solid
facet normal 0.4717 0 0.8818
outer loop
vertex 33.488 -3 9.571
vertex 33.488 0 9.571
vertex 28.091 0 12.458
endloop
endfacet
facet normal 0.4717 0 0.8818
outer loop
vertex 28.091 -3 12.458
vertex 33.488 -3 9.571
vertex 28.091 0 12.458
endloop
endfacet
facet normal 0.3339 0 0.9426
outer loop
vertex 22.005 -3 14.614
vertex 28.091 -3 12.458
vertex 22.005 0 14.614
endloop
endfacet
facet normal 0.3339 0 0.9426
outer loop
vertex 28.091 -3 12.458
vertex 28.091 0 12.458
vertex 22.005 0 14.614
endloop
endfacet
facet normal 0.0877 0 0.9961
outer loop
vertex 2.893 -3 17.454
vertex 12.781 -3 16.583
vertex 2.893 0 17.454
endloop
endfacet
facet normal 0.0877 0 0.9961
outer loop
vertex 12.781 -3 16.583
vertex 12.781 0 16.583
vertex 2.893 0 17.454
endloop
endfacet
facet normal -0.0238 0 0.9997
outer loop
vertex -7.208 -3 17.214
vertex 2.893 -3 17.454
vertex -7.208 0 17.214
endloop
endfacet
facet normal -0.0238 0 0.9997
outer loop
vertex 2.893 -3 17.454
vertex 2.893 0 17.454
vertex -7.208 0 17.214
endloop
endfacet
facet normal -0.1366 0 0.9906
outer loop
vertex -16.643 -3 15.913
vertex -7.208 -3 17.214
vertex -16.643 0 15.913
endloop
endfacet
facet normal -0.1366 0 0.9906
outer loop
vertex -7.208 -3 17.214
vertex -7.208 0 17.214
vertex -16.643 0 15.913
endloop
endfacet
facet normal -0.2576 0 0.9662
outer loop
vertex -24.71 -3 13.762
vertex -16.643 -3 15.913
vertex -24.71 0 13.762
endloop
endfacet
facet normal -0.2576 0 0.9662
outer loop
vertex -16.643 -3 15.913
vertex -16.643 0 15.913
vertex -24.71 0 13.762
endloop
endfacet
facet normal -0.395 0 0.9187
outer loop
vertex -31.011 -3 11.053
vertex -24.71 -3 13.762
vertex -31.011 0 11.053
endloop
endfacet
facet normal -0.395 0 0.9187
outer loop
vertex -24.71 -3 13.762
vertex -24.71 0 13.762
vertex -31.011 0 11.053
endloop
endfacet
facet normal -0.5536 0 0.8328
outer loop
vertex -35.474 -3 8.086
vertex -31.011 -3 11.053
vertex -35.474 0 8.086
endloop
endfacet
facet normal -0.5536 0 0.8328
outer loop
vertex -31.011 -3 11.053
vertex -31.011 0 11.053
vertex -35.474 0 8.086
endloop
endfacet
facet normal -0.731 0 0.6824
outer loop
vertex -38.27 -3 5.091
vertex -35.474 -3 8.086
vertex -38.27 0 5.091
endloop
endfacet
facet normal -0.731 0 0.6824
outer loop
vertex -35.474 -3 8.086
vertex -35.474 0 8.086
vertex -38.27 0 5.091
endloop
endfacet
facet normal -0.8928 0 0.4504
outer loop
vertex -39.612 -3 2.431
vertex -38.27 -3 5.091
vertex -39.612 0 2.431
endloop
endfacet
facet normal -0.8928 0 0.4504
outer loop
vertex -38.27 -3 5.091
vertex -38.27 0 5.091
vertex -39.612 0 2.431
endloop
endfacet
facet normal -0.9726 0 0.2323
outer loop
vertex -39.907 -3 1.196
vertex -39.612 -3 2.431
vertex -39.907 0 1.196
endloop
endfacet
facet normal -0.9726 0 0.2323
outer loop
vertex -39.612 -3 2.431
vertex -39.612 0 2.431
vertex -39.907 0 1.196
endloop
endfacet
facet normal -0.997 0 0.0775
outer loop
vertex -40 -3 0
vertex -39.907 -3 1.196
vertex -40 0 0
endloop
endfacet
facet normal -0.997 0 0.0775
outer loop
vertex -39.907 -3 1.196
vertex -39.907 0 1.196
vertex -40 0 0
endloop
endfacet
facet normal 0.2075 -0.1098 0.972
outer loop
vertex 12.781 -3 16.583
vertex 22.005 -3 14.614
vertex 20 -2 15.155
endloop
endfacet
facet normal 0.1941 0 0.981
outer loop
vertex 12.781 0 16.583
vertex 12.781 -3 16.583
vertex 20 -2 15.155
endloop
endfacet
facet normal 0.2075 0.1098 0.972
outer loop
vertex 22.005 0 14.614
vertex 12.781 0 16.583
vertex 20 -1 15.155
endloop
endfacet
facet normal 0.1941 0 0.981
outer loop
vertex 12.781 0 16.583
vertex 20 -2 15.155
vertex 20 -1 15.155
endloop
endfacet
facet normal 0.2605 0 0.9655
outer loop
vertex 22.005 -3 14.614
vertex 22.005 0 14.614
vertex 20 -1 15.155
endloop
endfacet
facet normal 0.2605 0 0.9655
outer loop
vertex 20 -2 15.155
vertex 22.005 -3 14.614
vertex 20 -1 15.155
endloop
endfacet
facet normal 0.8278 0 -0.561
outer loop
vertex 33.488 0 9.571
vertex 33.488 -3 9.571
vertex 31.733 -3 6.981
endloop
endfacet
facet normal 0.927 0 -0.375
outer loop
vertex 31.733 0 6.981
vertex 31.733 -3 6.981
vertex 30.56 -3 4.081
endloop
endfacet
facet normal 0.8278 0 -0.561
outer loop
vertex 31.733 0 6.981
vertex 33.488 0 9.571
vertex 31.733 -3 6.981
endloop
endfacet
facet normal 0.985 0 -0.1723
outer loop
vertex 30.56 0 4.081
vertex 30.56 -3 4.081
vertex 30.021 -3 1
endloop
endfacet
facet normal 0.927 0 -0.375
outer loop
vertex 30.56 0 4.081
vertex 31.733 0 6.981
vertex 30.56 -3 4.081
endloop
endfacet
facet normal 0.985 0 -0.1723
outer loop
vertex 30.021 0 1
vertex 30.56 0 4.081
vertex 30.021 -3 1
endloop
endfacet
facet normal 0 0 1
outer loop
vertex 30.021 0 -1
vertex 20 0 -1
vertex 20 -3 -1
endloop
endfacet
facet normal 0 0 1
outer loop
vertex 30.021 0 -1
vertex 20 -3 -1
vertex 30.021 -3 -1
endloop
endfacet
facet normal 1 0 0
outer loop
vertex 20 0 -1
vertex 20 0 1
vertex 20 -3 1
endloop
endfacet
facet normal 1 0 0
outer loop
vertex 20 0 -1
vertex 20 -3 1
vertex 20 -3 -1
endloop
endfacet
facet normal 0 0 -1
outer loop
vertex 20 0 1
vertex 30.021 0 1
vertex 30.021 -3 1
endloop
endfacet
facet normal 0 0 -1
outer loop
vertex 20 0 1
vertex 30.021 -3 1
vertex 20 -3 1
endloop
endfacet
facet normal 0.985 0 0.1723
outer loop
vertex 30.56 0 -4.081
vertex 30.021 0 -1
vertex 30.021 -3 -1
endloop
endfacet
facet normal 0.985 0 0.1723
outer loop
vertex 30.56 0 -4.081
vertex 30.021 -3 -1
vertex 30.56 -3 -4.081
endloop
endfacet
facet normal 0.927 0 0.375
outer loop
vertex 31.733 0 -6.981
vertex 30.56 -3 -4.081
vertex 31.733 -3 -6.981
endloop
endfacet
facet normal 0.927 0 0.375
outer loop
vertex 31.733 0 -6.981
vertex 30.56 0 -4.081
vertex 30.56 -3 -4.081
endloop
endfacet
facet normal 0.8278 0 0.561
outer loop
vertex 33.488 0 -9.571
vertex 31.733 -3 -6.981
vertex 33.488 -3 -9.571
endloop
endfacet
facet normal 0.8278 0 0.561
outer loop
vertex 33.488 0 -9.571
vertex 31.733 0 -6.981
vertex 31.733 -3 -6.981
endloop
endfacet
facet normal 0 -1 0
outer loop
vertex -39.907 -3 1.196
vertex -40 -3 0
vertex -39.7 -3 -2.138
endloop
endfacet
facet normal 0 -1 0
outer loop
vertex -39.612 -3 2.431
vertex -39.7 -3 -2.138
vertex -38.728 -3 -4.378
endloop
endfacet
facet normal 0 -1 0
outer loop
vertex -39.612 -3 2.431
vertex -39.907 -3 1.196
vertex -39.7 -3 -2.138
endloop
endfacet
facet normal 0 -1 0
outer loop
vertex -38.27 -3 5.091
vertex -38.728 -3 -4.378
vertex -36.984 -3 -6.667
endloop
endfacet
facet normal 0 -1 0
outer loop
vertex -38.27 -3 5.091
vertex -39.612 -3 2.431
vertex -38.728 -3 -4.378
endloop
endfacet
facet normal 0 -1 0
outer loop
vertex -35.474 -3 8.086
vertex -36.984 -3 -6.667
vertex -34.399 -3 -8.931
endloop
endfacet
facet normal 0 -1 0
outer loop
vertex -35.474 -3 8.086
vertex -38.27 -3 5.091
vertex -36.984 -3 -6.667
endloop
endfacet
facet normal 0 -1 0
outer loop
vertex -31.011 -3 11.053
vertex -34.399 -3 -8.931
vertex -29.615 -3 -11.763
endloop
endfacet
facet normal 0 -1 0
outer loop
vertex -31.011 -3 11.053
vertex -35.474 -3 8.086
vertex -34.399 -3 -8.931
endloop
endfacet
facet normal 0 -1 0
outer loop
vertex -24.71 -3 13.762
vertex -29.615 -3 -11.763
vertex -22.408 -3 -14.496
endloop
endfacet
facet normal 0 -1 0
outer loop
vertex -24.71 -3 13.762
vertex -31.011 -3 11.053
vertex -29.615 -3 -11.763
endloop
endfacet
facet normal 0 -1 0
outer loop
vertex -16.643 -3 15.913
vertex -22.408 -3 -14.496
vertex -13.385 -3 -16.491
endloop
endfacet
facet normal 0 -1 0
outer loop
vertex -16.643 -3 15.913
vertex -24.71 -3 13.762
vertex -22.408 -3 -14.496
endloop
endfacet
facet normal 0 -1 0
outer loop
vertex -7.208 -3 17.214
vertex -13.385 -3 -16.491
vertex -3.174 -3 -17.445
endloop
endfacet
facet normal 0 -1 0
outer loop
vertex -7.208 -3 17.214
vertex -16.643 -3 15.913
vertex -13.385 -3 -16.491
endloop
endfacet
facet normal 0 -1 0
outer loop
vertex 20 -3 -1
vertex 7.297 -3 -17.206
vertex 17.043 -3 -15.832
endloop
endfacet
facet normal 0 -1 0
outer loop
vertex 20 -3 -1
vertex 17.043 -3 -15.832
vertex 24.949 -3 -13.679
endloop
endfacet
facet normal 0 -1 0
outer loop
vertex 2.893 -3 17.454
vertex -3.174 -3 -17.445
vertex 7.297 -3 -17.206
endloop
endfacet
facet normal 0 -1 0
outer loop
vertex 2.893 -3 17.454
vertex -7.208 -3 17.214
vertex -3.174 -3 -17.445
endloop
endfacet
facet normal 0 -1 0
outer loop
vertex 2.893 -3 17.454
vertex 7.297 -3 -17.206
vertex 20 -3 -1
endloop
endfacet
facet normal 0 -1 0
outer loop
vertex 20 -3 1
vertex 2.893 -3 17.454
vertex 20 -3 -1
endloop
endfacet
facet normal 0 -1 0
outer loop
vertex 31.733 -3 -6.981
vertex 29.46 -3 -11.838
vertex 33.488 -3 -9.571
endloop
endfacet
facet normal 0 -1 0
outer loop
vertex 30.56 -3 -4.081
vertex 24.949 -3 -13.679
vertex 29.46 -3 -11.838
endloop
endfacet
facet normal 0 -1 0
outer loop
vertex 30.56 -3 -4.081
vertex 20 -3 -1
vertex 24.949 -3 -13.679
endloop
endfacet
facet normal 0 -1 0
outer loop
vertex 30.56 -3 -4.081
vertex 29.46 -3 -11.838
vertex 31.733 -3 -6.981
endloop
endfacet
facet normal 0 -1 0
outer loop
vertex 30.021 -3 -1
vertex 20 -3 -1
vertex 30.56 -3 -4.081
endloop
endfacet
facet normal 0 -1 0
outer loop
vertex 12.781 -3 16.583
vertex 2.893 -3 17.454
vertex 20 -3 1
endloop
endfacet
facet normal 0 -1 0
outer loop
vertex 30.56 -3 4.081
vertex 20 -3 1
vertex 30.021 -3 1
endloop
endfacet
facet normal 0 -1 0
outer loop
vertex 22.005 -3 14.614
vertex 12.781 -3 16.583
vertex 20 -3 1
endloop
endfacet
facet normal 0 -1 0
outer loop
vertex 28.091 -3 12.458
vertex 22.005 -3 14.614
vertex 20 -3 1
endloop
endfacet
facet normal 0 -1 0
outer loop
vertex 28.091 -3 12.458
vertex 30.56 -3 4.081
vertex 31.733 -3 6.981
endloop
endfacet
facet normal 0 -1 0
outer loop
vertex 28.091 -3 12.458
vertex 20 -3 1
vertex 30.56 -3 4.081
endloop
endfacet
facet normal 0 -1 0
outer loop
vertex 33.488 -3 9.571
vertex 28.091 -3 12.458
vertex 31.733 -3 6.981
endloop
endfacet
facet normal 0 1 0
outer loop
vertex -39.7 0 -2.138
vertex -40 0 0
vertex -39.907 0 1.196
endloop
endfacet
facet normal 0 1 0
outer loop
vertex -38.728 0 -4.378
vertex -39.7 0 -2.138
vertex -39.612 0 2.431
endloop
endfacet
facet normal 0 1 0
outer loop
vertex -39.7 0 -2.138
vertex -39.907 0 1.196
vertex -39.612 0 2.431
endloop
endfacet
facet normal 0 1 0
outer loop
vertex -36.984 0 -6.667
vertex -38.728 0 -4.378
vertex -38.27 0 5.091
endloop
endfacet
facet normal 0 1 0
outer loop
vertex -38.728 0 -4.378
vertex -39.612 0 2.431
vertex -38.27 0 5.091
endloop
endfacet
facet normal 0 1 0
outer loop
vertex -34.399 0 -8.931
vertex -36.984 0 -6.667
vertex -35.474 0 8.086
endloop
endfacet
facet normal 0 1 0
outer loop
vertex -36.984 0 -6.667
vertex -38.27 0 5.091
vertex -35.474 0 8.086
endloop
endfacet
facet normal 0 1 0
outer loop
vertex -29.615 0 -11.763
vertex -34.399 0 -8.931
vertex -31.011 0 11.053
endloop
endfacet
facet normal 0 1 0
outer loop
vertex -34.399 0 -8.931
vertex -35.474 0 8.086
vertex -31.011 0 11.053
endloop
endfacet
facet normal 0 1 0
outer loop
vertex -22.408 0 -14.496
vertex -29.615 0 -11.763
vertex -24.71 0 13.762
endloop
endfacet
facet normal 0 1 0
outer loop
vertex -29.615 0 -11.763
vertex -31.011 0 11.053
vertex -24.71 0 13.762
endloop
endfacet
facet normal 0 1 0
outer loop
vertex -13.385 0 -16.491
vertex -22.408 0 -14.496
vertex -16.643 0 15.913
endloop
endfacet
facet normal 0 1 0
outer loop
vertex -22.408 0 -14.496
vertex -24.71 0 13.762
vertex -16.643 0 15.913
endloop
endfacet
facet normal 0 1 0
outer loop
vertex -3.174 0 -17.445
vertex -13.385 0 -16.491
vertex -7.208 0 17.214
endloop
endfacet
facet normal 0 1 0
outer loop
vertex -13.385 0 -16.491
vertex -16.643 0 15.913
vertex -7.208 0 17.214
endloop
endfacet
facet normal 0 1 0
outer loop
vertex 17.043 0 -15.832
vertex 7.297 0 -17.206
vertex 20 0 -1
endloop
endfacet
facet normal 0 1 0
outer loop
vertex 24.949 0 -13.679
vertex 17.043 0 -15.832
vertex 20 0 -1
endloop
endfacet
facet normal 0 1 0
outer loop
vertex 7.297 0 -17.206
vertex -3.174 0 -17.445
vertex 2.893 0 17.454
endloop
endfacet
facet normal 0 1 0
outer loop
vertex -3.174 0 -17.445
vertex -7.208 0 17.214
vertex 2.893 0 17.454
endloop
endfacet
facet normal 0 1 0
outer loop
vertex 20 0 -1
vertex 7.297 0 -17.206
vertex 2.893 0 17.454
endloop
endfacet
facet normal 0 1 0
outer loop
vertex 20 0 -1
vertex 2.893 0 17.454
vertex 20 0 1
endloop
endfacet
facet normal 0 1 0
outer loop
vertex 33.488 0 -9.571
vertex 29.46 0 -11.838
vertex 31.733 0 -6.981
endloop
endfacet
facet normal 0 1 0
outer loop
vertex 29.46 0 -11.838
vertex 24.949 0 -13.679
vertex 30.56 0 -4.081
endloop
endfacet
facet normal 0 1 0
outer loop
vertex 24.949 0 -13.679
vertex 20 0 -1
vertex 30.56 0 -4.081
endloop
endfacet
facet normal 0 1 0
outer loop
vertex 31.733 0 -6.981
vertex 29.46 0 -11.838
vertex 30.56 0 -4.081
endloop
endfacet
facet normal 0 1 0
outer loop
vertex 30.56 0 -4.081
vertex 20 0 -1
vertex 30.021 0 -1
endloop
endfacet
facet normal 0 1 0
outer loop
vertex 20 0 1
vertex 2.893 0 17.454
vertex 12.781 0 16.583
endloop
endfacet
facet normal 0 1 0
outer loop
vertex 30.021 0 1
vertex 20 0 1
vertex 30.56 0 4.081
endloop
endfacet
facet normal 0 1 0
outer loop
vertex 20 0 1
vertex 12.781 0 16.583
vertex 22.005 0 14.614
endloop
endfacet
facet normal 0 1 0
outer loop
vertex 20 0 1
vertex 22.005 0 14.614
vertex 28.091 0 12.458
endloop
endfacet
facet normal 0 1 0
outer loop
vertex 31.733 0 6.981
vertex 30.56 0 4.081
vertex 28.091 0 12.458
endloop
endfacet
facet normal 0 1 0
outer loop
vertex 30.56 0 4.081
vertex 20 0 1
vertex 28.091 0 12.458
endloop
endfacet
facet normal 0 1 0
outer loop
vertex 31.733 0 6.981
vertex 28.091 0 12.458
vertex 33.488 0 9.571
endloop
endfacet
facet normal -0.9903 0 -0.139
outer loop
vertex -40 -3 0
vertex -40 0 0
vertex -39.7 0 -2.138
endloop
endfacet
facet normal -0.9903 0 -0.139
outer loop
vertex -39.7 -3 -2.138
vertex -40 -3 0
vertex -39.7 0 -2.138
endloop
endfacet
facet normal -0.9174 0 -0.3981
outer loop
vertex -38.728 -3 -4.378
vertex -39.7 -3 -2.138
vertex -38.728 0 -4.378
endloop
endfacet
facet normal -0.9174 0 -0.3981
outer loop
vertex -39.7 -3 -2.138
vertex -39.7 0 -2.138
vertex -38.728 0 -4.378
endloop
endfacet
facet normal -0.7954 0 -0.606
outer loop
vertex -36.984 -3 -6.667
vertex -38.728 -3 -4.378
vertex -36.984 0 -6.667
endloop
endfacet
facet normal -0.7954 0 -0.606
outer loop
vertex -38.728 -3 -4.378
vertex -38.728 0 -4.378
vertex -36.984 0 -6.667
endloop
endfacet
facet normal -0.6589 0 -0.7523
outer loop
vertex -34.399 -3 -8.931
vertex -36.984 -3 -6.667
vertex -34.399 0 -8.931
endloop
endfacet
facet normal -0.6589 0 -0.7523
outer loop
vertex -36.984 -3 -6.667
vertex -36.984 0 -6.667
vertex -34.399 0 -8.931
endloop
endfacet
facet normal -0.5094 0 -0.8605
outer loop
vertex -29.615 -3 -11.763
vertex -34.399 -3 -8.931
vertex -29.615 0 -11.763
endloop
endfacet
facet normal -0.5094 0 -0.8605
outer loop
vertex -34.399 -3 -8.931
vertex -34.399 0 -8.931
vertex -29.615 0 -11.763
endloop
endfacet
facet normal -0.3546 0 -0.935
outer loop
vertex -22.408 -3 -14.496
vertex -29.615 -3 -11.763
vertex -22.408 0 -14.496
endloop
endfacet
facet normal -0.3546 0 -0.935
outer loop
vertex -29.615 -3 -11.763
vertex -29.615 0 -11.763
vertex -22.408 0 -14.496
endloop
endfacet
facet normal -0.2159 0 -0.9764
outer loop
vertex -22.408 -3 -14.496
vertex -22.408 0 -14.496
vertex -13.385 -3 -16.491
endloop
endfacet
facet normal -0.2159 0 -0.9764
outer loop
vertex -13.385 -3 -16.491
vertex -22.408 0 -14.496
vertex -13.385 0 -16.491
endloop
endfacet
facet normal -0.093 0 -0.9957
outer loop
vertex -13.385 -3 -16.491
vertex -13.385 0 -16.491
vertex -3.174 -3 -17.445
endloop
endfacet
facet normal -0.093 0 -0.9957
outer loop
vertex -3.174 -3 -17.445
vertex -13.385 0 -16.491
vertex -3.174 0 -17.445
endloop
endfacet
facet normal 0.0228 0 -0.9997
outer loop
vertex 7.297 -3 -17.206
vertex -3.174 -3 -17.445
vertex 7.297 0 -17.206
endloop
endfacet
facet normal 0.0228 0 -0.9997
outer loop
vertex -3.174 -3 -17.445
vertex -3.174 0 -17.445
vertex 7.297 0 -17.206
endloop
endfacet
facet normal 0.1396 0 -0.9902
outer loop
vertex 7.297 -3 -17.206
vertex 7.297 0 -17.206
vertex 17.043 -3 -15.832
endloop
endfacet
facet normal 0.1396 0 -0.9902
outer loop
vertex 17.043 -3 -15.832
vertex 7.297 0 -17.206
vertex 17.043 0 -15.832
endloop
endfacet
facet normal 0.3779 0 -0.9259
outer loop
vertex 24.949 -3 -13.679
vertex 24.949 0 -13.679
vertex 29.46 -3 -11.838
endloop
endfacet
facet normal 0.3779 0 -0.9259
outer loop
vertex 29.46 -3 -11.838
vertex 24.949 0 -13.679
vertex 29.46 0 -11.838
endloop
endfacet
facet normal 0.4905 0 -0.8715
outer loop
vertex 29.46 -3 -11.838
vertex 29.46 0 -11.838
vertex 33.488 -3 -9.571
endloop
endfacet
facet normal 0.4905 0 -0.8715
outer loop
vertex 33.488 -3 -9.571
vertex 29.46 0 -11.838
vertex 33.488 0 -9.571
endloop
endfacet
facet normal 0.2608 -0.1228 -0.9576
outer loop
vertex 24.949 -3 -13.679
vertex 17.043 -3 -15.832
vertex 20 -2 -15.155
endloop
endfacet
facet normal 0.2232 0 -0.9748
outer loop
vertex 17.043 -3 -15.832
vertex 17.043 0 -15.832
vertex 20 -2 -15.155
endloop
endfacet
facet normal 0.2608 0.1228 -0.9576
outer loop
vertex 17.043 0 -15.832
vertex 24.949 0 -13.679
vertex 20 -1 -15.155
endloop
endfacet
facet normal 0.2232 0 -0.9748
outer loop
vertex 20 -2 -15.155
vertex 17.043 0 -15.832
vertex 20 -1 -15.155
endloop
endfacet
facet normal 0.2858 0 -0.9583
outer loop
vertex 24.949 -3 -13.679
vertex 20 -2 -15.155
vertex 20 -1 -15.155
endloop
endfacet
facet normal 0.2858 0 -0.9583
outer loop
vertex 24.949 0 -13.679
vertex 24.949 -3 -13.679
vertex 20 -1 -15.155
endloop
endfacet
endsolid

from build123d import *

# Parameters (mm, degrees)
F1_DEPTH = 3
F2_R     = 14.835774
F3_DEPTH = 25
F5_DEPTH = 25


with BuildPart() as f1:
    # F0 (on Front) → F1 (new body)
    with BuildSketch(Plane.XZ):
        with BuildLine():
            add(Edge.make_bspline(
                [(-40, 0), (-40, -30.310889), (20, -15.155445), (80, 0), (20, 15.155445), (-40, 30.310889), (-40, 0)],
                knots=[0, 0, 0, 2.094395, 2.094395, 4.18879, 4.18879, 6.283185, 6.283185, 6.283185], degree=2, weights=[1, 0.5, 1, 0.5, 1, 0.5, 1]))
        make_face()
    extrude(amount=F1_DEPTH)

    # F2 (on Front) → F3 (cut)
    with BuildSketch(Plane.XZ):
        with Locations((44.823118, 0)):
            Circle(F2_R)
    extrude(amount=F3_DEPTH, mode=Mode.SUBTRACT)

    # F4 (on Front) → F5 (cut)
    with BuildSketch(Plane.XZ):
        Polygon((35.474408, 1), (20, 1), (20, 0), (35.480917, 0), align=None)
        Polygon((40, 1), (35.474408, 1), (35.480917, 0), (35.487425, 0), (40, 0), align=None)
        Polygon((35.480917, 0), (20, 0), (20, -1), (35.487425, -1), align=None)
        Polygon((35.487425, 0), (35.480917, 0), (35.487425, -1), (40, -1), (40, 0), align=None)
    extrude(amount=F5_DEPTH, mode=Mode.SUBTRACT)


solid = f1.part
